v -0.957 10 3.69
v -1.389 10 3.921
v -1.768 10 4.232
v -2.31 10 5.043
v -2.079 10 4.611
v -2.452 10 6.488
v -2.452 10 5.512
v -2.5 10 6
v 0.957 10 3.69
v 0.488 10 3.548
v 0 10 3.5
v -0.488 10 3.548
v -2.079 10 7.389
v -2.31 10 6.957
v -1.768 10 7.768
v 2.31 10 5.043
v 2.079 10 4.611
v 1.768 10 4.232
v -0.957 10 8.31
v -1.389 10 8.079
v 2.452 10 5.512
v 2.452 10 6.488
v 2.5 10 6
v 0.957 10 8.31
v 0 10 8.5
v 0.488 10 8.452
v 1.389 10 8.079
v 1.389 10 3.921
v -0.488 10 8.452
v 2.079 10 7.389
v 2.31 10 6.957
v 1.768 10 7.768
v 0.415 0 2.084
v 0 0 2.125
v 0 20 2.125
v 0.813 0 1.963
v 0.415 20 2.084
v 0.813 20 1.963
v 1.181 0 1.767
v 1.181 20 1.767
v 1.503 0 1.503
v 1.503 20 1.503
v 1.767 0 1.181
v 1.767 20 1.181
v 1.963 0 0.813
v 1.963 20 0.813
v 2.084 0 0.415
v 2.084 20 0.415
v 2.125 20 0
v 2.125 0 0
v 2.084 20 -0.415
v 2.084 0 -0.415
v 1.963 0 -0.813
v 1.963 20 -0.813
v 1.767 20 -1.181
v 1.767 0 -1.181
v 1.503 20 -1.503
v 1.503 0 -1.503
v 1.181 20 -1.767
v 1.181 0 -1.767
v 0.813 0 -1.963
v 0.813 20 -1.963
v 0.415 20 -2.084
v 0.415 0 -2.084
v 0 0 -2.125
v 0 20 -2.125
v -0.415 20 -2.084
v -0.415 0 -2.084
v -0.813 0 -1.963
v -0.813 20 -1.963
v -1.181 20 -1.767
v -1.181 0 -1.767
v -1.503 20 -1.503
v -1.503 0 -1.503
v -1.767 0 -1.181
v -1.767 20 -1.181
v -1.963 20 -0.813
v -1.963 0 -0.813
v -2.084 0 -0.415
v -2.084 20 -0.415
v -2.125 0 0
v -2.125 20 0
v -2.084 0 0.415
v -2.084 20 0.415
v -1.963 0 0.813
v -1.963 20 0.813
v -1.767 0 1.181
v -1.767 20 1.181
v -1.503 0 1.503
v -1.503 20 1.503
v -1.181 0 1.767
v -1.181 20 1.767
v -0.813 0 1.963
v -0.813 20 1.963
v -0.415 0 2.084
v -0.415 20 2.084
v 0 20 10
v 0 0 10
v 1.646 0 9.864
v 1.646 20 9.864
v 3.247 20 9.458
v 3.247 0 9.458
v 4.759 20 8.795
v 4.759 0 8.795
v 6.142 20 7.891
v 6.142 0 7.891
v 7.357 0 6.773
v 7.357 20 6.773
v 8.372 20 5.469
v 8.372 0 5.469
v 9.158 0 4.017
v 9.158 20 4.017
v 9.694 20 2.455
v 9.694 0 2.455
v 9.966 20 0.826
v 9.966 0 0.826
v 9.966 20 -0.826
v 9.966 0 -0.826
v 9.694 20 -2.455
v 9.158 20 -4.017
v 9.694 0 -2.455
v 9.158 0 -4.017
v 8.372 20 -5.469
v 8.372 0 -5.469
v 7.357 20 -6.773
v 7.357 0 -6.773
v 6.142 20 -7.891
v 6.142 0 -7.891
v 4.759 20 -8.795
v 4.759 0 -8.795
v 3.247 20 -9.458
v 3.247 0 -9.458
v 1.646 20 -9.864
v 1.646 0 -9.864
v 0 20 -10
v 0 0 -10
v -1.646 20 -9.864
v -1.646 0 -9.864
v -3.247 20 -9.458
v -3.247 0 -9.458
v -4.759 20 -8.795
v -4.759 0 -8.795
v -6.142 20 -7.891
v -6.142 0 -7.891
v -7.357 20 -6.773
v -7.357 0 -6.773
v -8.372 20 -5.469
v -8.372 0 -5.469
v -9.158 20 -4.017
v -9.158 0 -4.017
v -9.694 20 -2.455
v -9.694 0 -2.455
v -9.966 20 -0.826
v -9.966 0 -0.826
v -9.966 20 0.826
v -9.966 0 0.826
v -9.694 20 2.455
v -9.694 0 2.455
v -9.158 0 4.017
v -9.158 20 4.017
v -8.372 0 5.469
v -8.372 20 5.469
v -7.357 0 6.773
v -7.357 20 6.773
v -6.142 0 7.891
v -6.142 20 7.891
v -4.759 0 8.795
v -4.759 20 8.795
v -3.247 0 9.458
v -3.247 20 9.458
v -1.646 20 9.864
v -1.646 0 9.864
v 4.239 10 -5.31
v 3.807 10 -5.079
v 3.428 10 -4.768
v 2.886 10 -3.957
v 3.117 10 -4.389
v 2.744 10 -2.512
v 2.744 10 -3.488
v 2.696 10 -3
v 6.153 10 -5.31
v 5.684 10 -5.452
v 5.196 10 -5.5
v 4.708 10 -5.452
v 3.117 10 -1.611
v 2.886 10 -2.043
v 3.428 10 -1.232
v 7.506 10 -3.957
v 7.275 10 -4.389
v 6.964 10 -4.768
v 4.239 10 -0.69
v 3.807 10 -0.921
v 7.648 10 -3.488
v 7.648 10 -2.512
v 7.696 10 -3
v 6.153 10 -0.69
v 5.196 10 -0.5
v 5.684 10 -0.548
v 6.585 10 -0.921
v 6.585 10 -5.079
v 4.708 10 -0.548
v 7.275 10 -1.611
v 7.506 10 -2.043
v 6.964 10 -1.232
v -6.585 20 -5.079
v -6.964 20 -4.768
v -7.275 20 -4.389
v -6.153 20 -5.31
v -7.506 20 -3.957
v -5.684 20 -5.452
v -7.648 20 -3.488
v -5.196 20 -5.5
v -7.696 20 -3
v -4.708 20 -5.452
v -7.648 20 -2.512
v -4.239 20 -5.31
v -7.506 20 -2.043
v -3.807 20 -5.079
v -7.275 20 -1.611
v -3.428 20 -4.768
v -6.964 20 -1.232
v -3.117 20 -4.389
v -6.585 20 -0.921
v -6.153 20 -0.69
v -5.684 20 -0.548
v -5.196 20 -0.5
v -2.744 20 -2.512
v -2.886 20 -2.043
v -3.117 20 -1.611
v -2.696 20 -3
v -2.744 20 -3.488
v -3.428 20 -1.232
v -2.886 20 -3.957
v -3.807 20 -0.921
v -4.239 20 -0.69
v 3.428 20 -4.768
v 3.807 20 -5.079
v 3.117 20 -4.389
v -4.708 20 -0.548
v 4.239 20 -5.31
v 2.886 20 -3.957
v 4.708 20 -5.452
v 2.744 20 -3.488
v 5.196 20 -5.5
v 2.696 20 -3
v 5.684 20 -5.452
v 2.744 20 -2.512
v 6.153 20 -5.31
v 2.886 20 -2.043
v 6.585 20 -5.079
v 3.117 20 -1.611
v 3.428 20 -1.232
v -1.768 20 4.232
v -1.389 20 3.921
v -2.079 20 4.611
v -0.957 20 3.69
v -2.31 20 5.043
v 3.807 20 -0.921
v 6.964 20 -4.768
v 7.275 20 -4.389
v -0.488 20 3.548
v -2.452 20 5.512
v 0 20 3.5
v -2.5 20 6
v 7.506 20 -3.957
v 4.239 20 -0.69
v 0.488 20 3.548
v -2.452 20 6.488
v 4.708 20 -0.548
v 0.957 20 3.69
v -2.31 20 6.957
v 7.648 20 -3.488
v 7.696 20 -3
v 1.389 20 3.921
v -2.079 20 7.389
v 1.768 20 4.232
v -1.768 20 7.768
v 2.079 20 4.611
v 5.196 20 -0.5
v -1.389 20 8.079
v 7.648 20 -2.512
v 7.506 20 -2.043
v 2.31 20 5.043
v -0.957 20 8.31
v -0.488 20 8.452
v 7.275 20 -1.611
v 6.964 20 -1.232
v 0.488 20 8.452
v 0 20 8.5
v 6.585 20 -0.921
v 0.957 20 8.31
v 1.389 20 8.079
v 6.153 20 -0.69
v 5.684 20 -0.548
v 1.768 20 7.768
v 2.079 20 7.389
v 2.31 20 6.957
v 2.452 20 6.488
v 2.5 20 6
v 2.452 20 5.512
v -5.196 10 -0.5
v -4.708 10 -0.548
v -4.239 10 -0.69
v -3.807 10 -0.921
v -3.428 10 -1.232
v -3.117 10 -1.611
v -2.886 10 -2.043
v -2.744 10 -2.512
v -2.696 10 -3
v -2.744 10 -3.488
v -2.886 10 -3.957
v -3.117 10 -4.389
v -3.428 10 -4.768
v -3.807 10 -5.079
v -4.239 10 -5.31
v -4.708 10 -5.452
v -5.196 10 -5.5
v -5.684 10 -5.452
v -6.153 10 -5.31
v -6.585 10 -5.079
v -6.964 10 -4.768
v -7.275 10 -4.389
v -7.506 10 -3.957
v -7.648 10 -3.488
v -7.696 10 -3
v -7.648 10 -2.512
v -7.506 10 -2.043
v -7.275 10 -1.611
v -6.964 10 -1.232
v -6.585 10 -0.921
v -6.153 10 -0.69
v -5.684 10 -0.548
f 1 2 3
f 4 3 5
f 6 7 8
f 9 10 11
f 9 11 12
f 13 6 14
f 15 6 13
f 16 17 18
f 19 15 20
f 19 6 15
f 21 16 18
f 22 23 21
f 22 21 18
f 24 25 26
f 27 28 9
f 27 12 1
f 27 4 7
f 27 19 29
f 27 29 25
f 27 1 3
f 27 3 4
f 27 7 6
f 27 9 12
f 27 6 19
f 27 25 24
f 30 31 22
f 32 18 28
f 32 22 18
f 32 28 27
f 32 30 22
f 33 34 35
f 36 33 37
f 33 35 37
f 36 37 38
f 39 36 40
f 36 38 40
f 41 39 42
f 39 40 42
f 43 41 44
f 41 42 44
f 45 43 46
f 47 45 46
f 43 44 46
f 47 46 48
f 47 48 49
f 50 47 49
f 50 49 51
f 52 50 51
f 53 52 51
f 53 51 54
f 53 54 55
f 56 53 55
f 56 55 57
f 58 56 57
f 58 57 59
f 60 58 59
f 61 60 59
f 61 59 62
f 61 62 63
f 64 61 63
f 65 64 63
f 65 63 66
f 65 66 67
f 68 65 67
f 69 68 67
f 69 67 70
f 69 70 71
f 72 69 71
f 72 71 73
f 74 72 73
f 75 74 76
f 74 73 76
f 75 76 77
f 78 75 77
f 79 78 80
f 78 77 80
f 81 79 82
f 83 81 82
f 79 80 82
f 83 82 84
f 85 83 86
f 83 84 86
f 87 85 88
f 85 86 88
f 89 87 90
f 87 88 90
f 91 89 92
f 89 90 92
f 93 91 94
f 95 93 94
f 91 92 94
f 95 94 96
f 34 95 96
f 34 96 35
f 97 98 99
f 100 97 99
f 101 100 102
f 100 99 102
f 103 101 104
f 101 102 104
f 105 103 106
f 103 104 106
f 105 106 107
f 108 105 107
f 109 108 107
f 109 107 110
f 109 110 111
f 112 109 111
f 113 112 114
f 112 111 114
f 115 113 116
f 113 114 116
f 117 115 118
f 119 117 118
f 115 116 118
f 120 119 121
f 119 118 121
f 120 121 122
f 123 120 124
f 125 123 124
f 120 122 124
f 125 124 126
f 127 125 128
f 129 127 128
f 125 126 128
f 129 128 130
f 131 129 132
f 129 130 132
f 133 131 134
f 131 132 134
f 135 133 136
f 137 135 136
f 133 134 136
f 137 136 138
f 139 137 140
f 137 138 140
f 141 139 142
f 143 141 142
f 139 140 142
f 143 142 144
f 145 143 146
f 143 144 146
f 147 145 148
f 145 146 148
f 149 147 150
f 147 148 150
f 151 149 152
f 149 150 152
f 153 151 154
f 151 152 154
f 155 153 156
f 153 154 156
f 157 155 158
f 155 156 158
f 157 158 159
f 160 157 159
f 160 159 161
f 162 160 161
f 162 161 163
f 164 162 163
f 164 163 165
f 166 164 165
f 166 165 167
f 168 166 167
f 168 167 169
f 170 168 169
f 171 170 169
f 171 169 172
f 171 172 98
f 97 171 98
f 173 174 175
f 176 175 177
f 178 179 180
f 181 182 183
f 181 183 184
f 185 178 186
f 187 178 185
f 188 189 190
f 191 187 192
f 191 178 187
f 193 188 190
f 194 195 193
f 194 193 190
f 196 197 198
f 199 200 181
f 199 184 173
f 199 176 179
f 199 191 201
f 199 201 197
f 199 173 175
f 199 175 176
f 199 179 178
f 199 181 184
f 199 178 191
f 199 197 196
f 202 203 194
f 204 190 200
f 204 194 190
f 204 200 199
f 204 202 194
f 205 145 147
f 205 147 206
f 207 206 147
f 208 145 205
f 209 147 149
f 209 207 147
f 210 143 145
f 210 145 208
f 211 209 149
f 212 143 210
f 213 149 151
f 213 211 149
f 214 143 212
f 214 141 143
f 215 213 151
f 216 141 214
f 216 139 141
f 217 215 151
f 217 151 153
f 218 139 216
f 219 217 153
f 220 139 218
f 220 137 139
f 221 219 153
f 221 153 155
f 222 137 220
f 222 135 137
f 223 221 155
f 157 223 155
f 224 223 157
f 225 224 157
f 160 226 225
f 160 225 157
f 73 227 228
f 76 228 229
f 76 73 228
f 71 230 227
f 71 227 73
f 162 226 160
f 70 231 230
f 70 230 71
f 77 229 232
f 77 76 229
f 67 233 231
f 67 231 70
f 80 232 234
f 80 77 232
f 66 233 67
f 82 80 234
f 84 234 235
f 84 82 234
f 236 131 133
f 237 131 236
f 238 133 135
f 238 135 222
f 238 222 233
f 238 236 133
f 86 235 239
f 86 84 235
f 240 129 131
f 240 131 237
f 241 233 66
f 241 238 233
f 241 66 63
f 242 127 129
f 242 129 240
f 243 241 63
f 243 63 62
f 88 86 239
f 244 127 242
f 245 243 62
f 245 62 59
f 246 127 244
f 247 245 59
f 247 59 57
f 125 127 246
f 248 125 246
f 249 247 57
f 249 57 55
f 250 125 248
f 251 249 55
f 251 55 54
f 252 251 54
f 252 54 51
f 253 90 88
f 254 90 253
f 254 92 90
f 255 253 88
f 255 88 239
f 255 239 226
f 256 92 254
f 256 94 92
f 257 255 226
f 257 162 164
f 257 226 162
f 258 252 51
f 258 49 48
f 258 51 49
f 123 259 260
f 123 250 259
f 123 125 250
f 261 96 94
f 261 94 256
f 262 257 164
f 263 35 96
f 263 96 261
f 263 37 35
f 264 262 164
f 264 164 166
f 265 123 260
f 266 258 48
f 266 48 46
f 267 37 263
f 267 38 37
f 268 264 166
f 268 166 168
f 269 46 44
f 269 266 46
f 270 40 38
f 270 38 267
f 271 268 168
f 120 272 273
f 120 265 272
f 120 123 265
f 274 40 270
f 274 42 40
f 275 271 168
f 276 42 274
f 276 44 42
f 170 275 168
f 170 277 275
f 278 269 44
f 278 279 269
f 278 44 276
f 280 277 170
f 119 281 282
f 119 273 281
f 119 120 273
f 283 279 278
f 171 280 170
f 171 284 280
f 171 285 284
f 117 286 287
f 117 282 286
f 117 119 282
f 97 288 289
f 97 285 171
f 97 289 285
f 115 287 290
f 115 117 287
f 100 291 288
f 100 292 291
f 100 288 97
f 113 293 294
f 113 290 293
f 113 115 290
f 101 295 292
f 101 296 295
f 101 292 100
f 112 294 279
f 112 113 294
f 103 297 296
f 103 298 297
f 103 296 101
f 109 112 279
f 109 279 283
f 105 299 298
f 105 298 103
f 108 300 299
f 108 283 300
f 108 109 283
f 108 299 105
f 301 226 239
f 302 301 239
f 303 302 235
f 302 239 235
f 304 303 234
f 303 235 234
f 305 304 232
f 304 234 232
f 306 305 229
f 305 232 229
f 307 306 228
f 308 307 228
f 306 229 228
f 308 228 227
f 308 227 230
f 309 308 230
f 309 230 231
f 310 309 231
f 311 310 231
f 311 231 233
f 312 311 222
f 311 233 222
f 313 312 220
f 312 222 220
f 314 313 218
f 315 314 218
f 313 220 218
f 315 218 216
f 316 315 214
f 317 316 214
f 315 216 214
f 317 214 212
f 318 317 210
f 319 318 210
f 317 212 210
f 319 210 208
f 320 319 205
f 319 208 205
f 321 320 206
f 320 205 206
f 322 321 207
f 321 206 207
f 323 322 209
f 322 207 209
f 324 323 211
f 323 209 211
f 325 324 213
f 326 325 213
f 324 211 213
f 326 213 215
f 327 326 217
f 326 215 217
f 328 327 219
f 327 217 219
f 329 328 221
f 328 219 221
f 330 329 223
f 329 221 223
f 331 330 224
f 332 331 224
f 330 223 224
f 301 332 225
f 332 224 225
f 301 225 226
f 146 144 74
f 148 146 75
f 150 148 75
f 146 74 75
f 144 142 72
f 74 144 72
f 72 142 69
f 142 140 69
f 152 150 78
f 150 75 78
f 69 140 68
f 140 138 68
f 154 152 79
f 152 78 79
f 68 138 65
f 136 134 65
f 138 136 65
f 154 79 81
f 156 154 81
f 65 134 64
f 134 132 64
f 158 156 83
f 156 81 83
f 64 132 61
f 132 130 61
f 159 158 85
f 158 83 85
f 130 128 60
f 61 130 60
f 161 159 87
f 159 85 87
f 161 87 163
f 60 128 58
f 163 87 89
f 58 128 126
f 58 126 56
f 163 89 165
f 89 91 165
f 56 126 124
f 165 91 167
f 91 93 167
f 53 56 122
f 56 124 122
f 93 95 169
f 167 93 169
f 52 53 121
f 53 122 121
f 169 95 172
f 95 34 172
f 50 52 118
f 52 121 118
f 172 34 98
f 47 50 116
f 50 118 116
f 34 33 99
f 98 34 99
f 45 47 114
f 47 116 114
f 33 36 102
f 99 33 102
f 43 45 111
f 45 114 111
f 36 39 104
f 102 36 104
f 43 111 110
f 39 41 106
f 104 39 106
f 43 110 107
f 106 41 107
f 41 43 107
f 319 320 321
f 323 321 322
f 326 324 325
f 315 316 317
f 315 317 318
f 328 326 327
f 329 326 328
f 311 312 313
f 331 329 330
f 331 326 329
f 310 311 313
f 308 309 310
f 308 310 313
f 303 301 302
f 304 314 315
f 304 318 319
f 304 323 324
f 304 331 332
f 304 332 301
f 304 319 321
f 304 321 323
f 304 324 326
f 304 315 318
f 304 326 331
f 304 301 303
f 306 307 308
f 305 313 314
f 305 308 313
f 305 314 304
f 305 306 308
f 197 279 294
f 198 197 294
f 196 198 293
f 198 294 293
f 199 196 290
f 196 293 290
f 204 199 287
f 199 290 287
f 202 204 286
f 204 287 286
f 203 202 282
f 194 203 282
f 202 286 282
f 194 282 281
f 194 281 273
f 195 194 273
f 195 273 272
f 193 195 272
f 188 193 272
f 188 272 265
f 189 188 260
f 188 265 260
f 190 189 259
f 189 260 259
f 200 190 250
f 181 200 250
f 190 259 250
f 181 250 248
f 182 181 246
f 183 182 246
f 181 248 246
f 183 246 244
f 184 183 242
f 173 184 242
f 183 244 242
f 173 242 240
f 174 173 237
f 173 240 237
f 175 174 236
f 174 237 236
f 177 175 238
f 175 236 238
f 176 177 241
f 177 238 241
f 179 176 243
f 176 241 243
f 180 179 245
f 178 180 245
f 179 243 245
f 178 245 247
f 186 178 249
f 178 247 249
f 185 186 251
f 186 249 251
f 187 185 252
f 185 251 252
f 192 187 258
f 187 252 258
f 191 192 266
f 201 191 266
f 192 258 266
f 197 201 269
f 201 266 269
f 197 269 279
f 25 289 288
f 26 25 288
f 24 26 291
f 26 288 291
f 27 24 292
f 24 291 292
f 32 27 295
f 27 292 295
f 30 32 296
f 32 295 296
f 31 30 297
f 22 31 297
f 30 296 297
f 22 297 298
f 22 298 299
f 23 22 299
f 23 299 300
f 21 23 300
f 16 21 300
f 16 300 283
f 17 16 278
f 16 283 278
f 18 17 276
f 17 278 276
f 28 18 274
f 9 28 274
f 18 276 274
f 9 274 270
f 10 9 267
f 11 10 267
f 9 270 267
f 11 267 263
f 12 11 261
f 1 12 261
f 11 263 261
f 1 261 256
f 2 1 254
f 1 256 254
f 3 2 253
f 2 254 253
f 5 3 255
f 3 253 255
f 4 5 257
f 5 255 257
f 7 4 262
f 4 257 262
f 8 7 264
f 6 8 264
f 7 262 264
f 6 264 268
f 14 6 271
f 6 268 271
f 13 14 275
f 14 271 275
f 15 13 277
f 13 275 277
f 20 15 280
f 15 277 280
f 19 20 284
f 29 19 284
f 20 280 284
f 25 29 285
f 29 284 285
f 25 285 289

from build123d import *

# Parameters (mm, degrees)
SKETCH1_R           = 10
BOSS_EXTRUDE1_DEPTH = 20
SKETCH2_R           = 2.5
CUT_EXTRUDE1_DEPTH  = 10
SKETCH2_3_R         = 2.125
CUT_EXTRUDE2_DEPTH  = 25.494897428


with BuildPart() as part:
    # Sketch1 → Boss-Extrude1 (new body)
    with BuildSketch(Plane(origin=(0, 0, 0), x_dir=(1, 0, 0), z_dir=(0, 1, 0))):
        Circle(SKETCH1_R)
    extrude(amount=BOSS_EXTRUDE1_DEPTH)

    # Sketch2 → Cut-Extrude1 (cut)
    with BuildSketch(Plane(origin=(0, 20, 0), x_dir=(1, 0, 0), z_dir=(0, 1, 0))):
        with Locations((0, -6)):
            Circle(SKETCH2_R)
        with Locations((-5.196152423, 3)):
            Circle(SKETCH2_R)
        with Locations((5.196152423, 3)):
            Circle(SKETCH2_R)
    extrude(amount=-CUT_EXTRUDE1_DEPTH, mode=Mode.SUBTRACT)

    # Sketch2<3> → Cut-Extrude2 (cut, through all)
    with BuildSketch(Plane(origin=(0, 20, 0), x_dir=(1, 0, 0), z_dir=(0, 1, 0))):
        Circle(SKETCH2_3_R)
    extrude(amount=-CUT_EXTRUDE2_DEPTH, mode=Mode.SUBTRACT)


solid = part.part
